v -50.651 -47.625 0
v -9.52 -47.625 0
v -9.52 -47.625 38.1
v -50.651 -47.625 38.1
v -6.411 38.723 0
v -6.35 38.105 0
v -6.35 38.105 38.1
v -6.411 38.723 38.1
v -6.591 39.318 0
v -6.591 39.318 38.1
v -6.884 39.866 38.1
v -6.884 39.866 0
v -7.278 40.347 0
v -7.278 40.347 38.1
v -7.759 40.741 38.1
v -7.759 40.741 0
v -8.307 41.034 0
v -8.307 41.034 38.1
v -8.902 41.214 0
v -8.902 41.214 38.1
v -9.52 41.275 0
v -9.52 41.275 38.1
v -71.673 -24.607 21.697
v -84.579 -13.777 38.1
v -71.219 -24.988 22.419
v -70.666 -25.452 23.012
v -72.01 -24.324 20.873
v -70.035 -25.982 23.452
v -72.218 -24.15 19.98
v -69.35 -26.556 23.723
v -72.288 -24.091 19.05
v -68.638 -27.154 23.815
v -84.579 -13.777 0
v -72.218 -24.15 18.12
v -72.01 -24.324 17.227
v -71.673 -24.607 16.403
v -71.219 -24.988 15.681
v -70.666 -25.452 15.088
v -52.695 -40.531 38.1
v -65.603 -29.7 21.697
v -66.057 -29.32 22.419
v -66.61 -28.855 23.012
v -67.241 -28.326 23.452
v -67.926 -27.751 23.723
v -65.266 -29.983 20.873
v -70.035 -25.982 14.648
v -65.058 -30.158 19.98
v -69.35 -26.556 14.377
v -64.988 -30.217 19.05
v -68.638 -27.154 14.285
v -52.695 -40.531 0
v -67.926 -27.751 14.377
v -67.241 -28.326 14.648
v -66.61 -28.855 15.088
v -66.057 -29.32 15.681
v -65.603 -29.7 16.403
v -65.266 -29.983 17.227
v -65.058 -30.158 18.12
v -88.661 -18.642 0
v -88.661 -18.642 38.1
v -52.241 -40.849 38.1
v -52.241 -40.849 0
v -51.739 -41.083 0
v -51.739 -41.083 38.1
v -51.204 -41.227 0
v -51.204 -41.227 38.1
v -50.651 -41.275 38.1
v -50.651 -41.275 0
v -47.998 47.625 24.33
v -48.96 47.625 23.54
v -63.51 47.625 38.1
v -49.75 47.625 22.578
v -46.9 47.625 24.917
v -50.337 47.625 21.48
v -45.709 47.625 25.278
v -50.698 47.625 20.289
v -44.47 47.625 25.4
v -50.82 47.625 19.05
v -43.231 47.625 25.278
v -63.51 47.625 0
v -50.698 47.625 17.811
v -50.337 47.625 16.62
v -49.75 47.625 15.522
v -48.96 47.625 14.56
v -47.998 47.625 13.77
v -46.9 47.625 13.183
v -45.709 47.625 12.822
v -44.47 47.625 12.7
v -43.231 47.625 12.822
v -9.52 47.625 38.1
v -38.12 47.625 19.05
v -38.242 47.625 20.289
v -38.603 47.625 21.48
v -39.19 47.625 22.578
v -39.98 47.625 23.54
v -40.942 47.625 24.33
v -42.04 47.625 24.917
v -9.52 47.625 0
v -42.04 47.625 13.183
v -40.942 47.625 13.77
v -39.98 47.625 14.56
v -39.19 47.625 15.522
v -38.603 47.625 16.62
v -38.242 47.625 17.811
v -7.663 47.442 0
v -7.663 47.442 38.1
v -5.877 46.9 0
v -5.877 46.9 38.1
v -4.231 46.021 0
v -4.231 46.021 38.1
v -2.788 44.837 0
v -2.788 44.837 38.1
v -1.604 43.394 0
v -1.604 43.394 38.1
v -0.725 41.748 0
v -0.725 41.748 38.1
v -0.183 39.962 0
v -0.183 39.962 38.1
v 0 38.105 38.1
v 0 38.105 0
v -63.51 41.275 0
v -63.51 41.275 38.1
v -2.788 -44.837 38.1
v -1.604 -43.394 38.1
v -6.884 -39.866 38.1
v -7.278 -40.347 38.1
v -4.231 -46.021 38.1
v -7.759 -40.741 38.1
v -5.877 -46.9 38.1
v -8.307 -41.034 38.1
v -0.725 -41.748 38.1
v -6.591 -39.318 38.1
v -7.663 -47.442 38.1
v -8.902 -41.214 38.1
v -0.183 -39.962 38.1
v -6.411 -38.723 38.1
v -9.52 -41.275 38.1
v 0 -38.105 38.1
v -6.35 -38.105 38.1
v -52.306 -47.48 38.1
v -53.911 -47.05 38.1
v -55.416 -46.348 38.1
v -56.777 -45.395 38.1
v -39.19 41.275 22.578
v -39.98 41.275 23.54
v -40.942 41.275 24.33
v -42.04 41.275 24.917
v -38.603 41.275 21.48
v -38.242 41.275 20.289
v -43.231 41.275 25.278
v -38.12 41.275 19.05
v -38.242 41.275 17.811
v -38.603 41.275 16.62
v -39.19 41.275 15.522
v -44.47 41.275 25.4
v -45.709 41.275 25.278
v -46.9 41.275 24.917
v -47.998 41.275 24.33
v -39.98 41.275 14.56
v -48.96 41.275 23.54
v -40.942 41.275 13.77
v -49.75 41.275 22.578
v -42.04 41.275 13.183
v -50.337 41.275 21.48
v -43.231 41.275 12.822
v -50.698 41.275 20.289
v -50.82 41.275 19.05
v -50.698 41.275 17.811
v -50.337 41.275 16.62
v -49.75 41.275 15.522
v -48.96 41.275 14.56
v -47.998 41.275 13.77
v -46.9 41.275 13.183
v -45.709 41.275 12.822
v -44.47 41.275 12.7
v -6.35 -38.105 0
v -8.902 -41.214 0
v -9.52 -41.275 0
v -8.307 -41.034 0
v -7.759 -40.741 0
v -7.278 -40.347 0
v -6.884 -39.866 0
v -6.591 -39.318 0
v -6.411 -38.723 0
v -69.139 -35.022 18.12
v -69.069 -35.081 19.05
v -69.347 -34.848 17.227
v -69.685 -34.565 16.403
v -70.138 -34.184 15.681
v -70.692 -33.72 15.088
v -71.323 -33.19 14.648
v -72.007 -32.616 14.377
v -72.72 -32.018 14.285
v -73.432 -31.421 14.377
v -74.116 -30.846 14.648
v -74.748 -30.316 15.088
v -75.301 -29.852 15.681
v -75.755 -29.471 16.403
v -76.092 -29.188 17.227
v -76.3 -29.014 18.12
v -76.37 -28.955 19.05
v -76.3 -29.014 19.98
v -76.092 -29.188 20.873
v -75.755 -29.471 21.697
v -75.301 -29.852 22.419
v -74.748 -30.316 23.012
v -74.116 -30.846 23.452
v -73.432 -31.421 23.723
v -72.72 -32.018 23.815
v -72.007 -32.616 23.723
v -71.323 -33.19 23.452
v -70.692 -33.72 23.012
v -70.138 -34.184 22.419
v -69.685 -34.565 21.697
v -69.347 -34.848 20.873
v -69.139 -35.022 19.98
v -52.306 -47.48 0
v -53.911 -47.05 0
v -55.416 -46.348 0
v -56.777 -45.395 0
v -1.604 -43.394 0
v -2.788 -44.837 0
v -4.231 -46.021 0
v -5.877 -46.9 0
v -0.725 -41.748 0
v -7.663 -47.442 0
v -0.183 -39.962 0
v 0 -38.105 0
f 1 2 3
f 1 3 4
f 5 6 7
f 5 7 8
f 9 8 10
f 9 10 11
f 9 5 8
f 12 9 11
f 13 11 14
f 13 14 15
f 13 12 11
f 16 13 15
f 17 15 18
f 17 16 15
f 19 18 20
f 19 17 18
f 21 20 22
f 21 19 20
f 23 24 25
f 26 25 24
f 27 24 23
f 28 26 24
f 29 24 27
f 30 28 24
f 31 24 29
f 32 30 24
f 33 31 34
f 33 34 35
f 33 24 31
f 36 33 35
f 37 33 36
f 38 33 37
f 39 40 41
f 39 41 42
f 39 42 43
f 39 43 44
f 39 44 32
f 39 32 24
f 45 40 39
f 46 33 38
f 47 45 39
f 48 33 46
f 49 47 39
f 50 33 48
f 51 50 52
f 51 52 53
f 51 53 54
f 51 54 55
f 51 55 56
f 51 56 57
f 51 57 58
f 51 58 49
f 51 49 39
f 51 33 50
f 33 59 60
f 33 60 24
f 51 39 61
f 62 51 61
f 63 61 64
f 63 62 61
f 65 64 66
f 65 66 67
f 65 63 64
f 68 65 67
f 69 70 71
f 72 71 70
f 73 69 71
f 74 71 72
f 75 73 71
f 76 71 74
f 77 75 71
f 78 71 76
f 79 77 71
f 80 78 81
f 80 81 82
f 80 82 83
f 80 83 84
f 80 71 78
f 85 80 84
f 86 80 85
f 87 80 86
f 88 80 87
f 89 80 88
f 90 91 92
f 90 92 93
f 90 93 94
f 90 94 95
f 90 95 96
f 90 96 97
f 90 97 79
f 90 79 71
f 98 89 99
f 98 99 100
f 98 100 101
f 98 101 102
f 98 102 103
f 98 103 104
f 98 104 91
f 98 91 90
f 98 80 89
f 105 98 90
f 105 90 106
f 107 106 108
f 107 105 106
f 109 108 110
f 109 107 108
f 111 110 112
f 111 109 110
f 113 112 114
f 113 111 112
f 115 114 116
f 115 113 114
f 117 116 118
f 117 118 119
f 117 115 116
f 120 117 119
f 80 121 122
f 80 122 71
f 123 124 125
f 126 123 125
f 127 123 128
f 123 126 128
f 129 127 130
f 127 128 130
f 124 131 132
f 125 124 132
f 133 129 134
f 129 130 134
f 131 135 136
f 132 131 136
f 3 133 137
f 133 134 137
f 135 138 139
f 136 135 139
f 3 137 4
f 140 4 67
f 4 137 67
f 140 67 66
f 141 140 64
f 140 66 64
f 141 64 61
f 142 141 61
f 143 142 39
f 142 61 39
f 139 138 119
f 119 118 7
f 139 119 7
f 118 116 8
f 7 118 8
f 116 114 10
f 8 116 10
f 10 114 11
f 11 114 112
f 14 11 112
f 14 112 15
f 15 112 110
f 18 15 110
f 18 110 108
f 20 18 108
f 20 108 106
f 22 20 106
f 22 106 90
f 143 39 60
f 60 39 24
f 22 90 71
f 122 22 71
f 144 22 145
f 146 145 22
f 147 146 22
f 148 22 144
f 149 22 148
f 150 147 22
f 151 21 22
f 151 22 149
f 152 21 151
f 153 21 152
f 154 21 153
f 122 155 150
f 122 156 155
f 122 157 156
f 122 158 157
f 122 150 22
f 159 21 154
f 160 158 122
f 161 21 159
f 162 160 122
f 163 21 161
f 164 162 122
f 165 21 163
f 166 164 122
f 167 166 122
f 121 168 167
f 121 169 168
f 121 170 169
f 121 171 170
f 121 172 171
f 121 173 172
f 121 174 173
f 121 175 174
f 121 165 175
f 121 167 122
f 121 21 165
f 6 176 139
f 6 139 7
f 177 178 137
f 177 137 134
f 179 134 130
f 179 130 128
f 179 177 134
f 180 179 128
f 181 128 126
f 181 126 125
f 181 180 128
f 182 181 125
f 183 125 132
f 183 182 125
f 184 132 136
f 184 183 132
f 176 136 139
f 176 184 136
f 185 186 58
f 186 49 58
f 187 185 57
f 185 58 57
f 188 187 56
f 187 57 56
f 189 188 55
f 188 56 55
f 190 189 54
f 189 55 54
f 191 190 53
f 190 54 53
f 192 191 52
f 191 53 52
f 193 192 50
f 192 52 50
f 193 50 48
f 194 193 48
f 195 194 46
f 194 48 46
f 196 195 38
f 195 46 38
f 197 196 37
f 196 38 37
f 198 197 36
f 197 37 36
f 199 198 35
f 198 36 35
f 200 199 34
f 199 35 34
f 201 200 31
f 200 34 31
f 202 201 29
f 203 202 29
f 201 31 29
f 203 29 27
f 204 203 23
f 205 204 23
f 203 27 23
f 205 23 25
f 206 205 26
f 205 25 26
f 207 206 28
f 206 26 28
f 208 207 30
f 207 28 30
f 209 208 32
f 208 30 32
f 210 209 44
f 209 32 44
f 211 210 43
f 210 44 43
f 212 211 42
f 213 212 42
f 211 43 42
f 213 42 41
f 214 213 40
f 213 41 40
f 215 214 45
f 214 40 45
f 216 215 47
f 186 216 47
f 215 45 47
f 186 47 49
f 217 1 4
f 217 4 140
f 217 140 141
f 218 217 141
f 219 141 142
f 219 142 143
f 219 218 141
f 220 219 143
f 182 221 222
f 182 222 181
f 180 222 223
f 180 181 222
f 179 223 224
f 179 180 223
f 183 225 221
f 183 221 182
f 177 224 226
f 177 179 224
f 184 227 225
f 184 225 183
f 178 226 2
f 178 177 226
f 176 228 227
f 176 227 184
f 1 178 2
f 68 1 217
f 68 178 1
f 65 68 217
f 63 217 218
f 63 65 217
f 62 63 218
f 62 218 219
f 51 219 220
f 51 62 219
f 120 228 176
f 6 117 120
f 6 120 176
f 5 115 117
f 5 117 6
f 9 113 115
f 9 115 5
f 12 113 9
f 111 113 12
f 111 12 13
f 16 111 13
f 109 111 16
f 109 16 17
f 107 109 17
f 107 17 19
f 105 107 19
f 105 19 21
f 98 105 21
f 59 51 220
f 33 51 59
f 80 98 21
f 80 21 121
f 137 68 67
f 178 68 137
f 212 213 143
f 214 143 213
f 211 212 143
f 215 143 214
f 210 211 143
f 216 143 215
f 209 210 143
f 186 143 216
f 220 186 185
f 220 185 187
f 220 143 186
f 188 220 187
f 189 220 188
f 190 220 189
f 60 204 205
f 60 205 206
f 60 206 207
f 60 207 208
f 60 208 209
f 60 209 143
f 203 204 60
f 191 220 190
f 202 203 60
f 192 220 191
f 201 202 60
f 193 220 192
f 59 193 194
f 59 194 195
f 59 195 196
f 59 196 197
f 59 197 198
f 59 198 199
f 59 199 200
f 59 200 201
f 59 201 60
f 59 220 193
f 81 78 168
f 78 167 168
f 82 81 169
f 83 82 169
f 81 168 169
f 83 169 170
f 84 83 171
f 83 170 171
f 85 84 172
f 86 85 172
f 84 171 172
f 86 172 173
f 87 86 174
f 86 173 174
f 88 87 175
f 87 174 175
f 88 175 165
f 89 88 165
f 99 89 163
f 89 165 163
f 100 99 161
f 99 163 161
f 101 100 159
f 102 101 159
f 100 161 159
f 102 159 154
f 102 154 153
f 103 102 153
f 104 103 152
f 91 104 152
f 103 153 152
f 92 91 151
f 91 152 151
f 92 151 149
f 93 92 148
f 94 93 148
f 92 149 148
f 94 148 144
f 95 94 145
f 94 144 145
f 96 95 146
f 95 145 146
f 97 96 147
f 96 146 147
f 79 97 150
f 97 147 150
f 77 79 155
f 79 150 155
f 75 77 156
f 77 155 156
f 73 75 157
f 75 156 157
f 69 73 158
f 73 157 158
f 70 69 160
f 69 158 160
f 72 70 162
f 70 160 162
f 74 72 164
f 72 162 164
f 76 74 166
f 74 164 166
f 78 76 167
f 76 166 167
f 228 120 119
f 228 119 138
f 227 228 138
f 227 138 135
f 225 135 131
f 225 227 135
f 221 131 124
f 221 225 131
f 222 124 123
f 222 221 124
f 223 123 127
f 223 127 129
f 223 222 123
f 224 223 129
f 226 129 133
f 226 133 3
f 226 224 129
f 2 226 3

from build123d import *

# Parameters (mm, degrees)
EXTRUDE_THIN1_DEPTH        = 38.1
F_10_0MM_DOWEL_HOLE1_D     = 12.7
F_10_0MM_DOWEL_HOLE1_DEPTH = 6.35
F_10_0MM_DOWEL_HOLE1_TIP   = 3.815464931
F_10_0MM_DOWEL_HOLE2_D     = 9.53
F_10_0MM_DOWEL_HOLE2_DEPTH = 6.35
F_10_0MM_DOWEL_HOLE2_TIP   = 2.86310085


with BuildPart() as part:
    # Sketch1 → Extrude-Thin1 (new body)
    with BuildSketch(Plane.XY):
        with BuildLine():
            Line((-63.51, 47.625), (-9.52, 47.625))
            ThreePointArc((-9.52, 47.625), (-2.788343443, 44.836656557), (0, 38.105))
            Line((0, 38.105), (0, -38.105))
            ThreePointArc((0, -38.105), (-2.788343443, -44.836656557), (-9.52, -47.625))
            Line((-9.52, -47.625), (-50.651363667, -47.625))
            ThreePointArc((-50.651363667, -47.625), (-53.910815633, -47.050270676), (-56.777129588, -45.395403543))
            Line((-56.777129588, -45.395403543), (-88.66094394, -18.641706679))
            Line((-88.66094394, -18.641706679), (-84.579242619, -13.777324465))
            Line((-84.579242619, -13.777324465), (-52.695428266, -40.531021329))
            ThreePointArc((-52.695428266, -40.531021329), (-51.738987723, -41.083222534), (-50.651363667, -41.275))
            Line((-50.651363667, -41.275), (-9.52, -41.275))
            ThreePointArc((-9.52, -41.275), (-7.278471504, -40.346528496), (-6.35, -38.105))
            Line((-6.35, -38.105), (-6.35, 38.105))
            ThreePointArc((-6.35, 38.105), (-7.278471504, 40.346528496), (-9.52, 41.275))
            Line((-9.52, 41.275), (-63.51, 41.275))
            Line((-63.51, 41.275), (-63.51, 47.625))
        make_face()
    extrude(amount=EXTRUDE_THIN1_DEPTH)

    # Ø10.0mm Dowel Hole1
    with Locations(Plane(origin=(0, 47.625, 0), x_dir=(1, 0, 0), z_dir=(0, 1, 0))):
        with Locations((-44.47, -19.05)):
            Hole(F_10_0MM_DOWEL_HOLE1_D / 2, depth=F_10_0MM_DOWEL_HOLE1_DEPTH)
            with Locations((0, 0, -(F_10_0MM_DOWEL_HOLE1_DEPTH + F_10_0MM_DOWEL_HOLE1_TIP / 2))):  # 118° drill point
                Cone(0, F_10_0MM_DOWEL_HOLE1_D / 2, F_10_0MM_DOWEL_HOLE1_TIP, mode=Mode.SUBTRACT)

    # Ø10.0mm Dowel Hole2
    with Locations(Plane(origin=(-45.811814931, -54.596395027, 0), x_dir=(-0.766044443, 0.64278761, 0), z_dir=(-0.64278761, -0.766044443, 0))):
        with Locations((35.12556535, -19.05)):
            Hole(F_10_0MM_DOWEL_HOLE2_D / 2, depth=F_10_0MM_DOWEL_HOLE2_DEPTH)
            with Locations((0, 0, -(F_10_0MM_DOWEL_HOLE2_DEPTH + F_10_0MM_DOWEL_HOLE2_TIP / 2))):  # 118° drill point
                Cone(0, F_10_0MM_DOWEL_HOLE2_D / 2, F_10_0MM_DOWEL_HOLE2_TIP, mode=Mode.SUBTRACT)


solid = part.part
